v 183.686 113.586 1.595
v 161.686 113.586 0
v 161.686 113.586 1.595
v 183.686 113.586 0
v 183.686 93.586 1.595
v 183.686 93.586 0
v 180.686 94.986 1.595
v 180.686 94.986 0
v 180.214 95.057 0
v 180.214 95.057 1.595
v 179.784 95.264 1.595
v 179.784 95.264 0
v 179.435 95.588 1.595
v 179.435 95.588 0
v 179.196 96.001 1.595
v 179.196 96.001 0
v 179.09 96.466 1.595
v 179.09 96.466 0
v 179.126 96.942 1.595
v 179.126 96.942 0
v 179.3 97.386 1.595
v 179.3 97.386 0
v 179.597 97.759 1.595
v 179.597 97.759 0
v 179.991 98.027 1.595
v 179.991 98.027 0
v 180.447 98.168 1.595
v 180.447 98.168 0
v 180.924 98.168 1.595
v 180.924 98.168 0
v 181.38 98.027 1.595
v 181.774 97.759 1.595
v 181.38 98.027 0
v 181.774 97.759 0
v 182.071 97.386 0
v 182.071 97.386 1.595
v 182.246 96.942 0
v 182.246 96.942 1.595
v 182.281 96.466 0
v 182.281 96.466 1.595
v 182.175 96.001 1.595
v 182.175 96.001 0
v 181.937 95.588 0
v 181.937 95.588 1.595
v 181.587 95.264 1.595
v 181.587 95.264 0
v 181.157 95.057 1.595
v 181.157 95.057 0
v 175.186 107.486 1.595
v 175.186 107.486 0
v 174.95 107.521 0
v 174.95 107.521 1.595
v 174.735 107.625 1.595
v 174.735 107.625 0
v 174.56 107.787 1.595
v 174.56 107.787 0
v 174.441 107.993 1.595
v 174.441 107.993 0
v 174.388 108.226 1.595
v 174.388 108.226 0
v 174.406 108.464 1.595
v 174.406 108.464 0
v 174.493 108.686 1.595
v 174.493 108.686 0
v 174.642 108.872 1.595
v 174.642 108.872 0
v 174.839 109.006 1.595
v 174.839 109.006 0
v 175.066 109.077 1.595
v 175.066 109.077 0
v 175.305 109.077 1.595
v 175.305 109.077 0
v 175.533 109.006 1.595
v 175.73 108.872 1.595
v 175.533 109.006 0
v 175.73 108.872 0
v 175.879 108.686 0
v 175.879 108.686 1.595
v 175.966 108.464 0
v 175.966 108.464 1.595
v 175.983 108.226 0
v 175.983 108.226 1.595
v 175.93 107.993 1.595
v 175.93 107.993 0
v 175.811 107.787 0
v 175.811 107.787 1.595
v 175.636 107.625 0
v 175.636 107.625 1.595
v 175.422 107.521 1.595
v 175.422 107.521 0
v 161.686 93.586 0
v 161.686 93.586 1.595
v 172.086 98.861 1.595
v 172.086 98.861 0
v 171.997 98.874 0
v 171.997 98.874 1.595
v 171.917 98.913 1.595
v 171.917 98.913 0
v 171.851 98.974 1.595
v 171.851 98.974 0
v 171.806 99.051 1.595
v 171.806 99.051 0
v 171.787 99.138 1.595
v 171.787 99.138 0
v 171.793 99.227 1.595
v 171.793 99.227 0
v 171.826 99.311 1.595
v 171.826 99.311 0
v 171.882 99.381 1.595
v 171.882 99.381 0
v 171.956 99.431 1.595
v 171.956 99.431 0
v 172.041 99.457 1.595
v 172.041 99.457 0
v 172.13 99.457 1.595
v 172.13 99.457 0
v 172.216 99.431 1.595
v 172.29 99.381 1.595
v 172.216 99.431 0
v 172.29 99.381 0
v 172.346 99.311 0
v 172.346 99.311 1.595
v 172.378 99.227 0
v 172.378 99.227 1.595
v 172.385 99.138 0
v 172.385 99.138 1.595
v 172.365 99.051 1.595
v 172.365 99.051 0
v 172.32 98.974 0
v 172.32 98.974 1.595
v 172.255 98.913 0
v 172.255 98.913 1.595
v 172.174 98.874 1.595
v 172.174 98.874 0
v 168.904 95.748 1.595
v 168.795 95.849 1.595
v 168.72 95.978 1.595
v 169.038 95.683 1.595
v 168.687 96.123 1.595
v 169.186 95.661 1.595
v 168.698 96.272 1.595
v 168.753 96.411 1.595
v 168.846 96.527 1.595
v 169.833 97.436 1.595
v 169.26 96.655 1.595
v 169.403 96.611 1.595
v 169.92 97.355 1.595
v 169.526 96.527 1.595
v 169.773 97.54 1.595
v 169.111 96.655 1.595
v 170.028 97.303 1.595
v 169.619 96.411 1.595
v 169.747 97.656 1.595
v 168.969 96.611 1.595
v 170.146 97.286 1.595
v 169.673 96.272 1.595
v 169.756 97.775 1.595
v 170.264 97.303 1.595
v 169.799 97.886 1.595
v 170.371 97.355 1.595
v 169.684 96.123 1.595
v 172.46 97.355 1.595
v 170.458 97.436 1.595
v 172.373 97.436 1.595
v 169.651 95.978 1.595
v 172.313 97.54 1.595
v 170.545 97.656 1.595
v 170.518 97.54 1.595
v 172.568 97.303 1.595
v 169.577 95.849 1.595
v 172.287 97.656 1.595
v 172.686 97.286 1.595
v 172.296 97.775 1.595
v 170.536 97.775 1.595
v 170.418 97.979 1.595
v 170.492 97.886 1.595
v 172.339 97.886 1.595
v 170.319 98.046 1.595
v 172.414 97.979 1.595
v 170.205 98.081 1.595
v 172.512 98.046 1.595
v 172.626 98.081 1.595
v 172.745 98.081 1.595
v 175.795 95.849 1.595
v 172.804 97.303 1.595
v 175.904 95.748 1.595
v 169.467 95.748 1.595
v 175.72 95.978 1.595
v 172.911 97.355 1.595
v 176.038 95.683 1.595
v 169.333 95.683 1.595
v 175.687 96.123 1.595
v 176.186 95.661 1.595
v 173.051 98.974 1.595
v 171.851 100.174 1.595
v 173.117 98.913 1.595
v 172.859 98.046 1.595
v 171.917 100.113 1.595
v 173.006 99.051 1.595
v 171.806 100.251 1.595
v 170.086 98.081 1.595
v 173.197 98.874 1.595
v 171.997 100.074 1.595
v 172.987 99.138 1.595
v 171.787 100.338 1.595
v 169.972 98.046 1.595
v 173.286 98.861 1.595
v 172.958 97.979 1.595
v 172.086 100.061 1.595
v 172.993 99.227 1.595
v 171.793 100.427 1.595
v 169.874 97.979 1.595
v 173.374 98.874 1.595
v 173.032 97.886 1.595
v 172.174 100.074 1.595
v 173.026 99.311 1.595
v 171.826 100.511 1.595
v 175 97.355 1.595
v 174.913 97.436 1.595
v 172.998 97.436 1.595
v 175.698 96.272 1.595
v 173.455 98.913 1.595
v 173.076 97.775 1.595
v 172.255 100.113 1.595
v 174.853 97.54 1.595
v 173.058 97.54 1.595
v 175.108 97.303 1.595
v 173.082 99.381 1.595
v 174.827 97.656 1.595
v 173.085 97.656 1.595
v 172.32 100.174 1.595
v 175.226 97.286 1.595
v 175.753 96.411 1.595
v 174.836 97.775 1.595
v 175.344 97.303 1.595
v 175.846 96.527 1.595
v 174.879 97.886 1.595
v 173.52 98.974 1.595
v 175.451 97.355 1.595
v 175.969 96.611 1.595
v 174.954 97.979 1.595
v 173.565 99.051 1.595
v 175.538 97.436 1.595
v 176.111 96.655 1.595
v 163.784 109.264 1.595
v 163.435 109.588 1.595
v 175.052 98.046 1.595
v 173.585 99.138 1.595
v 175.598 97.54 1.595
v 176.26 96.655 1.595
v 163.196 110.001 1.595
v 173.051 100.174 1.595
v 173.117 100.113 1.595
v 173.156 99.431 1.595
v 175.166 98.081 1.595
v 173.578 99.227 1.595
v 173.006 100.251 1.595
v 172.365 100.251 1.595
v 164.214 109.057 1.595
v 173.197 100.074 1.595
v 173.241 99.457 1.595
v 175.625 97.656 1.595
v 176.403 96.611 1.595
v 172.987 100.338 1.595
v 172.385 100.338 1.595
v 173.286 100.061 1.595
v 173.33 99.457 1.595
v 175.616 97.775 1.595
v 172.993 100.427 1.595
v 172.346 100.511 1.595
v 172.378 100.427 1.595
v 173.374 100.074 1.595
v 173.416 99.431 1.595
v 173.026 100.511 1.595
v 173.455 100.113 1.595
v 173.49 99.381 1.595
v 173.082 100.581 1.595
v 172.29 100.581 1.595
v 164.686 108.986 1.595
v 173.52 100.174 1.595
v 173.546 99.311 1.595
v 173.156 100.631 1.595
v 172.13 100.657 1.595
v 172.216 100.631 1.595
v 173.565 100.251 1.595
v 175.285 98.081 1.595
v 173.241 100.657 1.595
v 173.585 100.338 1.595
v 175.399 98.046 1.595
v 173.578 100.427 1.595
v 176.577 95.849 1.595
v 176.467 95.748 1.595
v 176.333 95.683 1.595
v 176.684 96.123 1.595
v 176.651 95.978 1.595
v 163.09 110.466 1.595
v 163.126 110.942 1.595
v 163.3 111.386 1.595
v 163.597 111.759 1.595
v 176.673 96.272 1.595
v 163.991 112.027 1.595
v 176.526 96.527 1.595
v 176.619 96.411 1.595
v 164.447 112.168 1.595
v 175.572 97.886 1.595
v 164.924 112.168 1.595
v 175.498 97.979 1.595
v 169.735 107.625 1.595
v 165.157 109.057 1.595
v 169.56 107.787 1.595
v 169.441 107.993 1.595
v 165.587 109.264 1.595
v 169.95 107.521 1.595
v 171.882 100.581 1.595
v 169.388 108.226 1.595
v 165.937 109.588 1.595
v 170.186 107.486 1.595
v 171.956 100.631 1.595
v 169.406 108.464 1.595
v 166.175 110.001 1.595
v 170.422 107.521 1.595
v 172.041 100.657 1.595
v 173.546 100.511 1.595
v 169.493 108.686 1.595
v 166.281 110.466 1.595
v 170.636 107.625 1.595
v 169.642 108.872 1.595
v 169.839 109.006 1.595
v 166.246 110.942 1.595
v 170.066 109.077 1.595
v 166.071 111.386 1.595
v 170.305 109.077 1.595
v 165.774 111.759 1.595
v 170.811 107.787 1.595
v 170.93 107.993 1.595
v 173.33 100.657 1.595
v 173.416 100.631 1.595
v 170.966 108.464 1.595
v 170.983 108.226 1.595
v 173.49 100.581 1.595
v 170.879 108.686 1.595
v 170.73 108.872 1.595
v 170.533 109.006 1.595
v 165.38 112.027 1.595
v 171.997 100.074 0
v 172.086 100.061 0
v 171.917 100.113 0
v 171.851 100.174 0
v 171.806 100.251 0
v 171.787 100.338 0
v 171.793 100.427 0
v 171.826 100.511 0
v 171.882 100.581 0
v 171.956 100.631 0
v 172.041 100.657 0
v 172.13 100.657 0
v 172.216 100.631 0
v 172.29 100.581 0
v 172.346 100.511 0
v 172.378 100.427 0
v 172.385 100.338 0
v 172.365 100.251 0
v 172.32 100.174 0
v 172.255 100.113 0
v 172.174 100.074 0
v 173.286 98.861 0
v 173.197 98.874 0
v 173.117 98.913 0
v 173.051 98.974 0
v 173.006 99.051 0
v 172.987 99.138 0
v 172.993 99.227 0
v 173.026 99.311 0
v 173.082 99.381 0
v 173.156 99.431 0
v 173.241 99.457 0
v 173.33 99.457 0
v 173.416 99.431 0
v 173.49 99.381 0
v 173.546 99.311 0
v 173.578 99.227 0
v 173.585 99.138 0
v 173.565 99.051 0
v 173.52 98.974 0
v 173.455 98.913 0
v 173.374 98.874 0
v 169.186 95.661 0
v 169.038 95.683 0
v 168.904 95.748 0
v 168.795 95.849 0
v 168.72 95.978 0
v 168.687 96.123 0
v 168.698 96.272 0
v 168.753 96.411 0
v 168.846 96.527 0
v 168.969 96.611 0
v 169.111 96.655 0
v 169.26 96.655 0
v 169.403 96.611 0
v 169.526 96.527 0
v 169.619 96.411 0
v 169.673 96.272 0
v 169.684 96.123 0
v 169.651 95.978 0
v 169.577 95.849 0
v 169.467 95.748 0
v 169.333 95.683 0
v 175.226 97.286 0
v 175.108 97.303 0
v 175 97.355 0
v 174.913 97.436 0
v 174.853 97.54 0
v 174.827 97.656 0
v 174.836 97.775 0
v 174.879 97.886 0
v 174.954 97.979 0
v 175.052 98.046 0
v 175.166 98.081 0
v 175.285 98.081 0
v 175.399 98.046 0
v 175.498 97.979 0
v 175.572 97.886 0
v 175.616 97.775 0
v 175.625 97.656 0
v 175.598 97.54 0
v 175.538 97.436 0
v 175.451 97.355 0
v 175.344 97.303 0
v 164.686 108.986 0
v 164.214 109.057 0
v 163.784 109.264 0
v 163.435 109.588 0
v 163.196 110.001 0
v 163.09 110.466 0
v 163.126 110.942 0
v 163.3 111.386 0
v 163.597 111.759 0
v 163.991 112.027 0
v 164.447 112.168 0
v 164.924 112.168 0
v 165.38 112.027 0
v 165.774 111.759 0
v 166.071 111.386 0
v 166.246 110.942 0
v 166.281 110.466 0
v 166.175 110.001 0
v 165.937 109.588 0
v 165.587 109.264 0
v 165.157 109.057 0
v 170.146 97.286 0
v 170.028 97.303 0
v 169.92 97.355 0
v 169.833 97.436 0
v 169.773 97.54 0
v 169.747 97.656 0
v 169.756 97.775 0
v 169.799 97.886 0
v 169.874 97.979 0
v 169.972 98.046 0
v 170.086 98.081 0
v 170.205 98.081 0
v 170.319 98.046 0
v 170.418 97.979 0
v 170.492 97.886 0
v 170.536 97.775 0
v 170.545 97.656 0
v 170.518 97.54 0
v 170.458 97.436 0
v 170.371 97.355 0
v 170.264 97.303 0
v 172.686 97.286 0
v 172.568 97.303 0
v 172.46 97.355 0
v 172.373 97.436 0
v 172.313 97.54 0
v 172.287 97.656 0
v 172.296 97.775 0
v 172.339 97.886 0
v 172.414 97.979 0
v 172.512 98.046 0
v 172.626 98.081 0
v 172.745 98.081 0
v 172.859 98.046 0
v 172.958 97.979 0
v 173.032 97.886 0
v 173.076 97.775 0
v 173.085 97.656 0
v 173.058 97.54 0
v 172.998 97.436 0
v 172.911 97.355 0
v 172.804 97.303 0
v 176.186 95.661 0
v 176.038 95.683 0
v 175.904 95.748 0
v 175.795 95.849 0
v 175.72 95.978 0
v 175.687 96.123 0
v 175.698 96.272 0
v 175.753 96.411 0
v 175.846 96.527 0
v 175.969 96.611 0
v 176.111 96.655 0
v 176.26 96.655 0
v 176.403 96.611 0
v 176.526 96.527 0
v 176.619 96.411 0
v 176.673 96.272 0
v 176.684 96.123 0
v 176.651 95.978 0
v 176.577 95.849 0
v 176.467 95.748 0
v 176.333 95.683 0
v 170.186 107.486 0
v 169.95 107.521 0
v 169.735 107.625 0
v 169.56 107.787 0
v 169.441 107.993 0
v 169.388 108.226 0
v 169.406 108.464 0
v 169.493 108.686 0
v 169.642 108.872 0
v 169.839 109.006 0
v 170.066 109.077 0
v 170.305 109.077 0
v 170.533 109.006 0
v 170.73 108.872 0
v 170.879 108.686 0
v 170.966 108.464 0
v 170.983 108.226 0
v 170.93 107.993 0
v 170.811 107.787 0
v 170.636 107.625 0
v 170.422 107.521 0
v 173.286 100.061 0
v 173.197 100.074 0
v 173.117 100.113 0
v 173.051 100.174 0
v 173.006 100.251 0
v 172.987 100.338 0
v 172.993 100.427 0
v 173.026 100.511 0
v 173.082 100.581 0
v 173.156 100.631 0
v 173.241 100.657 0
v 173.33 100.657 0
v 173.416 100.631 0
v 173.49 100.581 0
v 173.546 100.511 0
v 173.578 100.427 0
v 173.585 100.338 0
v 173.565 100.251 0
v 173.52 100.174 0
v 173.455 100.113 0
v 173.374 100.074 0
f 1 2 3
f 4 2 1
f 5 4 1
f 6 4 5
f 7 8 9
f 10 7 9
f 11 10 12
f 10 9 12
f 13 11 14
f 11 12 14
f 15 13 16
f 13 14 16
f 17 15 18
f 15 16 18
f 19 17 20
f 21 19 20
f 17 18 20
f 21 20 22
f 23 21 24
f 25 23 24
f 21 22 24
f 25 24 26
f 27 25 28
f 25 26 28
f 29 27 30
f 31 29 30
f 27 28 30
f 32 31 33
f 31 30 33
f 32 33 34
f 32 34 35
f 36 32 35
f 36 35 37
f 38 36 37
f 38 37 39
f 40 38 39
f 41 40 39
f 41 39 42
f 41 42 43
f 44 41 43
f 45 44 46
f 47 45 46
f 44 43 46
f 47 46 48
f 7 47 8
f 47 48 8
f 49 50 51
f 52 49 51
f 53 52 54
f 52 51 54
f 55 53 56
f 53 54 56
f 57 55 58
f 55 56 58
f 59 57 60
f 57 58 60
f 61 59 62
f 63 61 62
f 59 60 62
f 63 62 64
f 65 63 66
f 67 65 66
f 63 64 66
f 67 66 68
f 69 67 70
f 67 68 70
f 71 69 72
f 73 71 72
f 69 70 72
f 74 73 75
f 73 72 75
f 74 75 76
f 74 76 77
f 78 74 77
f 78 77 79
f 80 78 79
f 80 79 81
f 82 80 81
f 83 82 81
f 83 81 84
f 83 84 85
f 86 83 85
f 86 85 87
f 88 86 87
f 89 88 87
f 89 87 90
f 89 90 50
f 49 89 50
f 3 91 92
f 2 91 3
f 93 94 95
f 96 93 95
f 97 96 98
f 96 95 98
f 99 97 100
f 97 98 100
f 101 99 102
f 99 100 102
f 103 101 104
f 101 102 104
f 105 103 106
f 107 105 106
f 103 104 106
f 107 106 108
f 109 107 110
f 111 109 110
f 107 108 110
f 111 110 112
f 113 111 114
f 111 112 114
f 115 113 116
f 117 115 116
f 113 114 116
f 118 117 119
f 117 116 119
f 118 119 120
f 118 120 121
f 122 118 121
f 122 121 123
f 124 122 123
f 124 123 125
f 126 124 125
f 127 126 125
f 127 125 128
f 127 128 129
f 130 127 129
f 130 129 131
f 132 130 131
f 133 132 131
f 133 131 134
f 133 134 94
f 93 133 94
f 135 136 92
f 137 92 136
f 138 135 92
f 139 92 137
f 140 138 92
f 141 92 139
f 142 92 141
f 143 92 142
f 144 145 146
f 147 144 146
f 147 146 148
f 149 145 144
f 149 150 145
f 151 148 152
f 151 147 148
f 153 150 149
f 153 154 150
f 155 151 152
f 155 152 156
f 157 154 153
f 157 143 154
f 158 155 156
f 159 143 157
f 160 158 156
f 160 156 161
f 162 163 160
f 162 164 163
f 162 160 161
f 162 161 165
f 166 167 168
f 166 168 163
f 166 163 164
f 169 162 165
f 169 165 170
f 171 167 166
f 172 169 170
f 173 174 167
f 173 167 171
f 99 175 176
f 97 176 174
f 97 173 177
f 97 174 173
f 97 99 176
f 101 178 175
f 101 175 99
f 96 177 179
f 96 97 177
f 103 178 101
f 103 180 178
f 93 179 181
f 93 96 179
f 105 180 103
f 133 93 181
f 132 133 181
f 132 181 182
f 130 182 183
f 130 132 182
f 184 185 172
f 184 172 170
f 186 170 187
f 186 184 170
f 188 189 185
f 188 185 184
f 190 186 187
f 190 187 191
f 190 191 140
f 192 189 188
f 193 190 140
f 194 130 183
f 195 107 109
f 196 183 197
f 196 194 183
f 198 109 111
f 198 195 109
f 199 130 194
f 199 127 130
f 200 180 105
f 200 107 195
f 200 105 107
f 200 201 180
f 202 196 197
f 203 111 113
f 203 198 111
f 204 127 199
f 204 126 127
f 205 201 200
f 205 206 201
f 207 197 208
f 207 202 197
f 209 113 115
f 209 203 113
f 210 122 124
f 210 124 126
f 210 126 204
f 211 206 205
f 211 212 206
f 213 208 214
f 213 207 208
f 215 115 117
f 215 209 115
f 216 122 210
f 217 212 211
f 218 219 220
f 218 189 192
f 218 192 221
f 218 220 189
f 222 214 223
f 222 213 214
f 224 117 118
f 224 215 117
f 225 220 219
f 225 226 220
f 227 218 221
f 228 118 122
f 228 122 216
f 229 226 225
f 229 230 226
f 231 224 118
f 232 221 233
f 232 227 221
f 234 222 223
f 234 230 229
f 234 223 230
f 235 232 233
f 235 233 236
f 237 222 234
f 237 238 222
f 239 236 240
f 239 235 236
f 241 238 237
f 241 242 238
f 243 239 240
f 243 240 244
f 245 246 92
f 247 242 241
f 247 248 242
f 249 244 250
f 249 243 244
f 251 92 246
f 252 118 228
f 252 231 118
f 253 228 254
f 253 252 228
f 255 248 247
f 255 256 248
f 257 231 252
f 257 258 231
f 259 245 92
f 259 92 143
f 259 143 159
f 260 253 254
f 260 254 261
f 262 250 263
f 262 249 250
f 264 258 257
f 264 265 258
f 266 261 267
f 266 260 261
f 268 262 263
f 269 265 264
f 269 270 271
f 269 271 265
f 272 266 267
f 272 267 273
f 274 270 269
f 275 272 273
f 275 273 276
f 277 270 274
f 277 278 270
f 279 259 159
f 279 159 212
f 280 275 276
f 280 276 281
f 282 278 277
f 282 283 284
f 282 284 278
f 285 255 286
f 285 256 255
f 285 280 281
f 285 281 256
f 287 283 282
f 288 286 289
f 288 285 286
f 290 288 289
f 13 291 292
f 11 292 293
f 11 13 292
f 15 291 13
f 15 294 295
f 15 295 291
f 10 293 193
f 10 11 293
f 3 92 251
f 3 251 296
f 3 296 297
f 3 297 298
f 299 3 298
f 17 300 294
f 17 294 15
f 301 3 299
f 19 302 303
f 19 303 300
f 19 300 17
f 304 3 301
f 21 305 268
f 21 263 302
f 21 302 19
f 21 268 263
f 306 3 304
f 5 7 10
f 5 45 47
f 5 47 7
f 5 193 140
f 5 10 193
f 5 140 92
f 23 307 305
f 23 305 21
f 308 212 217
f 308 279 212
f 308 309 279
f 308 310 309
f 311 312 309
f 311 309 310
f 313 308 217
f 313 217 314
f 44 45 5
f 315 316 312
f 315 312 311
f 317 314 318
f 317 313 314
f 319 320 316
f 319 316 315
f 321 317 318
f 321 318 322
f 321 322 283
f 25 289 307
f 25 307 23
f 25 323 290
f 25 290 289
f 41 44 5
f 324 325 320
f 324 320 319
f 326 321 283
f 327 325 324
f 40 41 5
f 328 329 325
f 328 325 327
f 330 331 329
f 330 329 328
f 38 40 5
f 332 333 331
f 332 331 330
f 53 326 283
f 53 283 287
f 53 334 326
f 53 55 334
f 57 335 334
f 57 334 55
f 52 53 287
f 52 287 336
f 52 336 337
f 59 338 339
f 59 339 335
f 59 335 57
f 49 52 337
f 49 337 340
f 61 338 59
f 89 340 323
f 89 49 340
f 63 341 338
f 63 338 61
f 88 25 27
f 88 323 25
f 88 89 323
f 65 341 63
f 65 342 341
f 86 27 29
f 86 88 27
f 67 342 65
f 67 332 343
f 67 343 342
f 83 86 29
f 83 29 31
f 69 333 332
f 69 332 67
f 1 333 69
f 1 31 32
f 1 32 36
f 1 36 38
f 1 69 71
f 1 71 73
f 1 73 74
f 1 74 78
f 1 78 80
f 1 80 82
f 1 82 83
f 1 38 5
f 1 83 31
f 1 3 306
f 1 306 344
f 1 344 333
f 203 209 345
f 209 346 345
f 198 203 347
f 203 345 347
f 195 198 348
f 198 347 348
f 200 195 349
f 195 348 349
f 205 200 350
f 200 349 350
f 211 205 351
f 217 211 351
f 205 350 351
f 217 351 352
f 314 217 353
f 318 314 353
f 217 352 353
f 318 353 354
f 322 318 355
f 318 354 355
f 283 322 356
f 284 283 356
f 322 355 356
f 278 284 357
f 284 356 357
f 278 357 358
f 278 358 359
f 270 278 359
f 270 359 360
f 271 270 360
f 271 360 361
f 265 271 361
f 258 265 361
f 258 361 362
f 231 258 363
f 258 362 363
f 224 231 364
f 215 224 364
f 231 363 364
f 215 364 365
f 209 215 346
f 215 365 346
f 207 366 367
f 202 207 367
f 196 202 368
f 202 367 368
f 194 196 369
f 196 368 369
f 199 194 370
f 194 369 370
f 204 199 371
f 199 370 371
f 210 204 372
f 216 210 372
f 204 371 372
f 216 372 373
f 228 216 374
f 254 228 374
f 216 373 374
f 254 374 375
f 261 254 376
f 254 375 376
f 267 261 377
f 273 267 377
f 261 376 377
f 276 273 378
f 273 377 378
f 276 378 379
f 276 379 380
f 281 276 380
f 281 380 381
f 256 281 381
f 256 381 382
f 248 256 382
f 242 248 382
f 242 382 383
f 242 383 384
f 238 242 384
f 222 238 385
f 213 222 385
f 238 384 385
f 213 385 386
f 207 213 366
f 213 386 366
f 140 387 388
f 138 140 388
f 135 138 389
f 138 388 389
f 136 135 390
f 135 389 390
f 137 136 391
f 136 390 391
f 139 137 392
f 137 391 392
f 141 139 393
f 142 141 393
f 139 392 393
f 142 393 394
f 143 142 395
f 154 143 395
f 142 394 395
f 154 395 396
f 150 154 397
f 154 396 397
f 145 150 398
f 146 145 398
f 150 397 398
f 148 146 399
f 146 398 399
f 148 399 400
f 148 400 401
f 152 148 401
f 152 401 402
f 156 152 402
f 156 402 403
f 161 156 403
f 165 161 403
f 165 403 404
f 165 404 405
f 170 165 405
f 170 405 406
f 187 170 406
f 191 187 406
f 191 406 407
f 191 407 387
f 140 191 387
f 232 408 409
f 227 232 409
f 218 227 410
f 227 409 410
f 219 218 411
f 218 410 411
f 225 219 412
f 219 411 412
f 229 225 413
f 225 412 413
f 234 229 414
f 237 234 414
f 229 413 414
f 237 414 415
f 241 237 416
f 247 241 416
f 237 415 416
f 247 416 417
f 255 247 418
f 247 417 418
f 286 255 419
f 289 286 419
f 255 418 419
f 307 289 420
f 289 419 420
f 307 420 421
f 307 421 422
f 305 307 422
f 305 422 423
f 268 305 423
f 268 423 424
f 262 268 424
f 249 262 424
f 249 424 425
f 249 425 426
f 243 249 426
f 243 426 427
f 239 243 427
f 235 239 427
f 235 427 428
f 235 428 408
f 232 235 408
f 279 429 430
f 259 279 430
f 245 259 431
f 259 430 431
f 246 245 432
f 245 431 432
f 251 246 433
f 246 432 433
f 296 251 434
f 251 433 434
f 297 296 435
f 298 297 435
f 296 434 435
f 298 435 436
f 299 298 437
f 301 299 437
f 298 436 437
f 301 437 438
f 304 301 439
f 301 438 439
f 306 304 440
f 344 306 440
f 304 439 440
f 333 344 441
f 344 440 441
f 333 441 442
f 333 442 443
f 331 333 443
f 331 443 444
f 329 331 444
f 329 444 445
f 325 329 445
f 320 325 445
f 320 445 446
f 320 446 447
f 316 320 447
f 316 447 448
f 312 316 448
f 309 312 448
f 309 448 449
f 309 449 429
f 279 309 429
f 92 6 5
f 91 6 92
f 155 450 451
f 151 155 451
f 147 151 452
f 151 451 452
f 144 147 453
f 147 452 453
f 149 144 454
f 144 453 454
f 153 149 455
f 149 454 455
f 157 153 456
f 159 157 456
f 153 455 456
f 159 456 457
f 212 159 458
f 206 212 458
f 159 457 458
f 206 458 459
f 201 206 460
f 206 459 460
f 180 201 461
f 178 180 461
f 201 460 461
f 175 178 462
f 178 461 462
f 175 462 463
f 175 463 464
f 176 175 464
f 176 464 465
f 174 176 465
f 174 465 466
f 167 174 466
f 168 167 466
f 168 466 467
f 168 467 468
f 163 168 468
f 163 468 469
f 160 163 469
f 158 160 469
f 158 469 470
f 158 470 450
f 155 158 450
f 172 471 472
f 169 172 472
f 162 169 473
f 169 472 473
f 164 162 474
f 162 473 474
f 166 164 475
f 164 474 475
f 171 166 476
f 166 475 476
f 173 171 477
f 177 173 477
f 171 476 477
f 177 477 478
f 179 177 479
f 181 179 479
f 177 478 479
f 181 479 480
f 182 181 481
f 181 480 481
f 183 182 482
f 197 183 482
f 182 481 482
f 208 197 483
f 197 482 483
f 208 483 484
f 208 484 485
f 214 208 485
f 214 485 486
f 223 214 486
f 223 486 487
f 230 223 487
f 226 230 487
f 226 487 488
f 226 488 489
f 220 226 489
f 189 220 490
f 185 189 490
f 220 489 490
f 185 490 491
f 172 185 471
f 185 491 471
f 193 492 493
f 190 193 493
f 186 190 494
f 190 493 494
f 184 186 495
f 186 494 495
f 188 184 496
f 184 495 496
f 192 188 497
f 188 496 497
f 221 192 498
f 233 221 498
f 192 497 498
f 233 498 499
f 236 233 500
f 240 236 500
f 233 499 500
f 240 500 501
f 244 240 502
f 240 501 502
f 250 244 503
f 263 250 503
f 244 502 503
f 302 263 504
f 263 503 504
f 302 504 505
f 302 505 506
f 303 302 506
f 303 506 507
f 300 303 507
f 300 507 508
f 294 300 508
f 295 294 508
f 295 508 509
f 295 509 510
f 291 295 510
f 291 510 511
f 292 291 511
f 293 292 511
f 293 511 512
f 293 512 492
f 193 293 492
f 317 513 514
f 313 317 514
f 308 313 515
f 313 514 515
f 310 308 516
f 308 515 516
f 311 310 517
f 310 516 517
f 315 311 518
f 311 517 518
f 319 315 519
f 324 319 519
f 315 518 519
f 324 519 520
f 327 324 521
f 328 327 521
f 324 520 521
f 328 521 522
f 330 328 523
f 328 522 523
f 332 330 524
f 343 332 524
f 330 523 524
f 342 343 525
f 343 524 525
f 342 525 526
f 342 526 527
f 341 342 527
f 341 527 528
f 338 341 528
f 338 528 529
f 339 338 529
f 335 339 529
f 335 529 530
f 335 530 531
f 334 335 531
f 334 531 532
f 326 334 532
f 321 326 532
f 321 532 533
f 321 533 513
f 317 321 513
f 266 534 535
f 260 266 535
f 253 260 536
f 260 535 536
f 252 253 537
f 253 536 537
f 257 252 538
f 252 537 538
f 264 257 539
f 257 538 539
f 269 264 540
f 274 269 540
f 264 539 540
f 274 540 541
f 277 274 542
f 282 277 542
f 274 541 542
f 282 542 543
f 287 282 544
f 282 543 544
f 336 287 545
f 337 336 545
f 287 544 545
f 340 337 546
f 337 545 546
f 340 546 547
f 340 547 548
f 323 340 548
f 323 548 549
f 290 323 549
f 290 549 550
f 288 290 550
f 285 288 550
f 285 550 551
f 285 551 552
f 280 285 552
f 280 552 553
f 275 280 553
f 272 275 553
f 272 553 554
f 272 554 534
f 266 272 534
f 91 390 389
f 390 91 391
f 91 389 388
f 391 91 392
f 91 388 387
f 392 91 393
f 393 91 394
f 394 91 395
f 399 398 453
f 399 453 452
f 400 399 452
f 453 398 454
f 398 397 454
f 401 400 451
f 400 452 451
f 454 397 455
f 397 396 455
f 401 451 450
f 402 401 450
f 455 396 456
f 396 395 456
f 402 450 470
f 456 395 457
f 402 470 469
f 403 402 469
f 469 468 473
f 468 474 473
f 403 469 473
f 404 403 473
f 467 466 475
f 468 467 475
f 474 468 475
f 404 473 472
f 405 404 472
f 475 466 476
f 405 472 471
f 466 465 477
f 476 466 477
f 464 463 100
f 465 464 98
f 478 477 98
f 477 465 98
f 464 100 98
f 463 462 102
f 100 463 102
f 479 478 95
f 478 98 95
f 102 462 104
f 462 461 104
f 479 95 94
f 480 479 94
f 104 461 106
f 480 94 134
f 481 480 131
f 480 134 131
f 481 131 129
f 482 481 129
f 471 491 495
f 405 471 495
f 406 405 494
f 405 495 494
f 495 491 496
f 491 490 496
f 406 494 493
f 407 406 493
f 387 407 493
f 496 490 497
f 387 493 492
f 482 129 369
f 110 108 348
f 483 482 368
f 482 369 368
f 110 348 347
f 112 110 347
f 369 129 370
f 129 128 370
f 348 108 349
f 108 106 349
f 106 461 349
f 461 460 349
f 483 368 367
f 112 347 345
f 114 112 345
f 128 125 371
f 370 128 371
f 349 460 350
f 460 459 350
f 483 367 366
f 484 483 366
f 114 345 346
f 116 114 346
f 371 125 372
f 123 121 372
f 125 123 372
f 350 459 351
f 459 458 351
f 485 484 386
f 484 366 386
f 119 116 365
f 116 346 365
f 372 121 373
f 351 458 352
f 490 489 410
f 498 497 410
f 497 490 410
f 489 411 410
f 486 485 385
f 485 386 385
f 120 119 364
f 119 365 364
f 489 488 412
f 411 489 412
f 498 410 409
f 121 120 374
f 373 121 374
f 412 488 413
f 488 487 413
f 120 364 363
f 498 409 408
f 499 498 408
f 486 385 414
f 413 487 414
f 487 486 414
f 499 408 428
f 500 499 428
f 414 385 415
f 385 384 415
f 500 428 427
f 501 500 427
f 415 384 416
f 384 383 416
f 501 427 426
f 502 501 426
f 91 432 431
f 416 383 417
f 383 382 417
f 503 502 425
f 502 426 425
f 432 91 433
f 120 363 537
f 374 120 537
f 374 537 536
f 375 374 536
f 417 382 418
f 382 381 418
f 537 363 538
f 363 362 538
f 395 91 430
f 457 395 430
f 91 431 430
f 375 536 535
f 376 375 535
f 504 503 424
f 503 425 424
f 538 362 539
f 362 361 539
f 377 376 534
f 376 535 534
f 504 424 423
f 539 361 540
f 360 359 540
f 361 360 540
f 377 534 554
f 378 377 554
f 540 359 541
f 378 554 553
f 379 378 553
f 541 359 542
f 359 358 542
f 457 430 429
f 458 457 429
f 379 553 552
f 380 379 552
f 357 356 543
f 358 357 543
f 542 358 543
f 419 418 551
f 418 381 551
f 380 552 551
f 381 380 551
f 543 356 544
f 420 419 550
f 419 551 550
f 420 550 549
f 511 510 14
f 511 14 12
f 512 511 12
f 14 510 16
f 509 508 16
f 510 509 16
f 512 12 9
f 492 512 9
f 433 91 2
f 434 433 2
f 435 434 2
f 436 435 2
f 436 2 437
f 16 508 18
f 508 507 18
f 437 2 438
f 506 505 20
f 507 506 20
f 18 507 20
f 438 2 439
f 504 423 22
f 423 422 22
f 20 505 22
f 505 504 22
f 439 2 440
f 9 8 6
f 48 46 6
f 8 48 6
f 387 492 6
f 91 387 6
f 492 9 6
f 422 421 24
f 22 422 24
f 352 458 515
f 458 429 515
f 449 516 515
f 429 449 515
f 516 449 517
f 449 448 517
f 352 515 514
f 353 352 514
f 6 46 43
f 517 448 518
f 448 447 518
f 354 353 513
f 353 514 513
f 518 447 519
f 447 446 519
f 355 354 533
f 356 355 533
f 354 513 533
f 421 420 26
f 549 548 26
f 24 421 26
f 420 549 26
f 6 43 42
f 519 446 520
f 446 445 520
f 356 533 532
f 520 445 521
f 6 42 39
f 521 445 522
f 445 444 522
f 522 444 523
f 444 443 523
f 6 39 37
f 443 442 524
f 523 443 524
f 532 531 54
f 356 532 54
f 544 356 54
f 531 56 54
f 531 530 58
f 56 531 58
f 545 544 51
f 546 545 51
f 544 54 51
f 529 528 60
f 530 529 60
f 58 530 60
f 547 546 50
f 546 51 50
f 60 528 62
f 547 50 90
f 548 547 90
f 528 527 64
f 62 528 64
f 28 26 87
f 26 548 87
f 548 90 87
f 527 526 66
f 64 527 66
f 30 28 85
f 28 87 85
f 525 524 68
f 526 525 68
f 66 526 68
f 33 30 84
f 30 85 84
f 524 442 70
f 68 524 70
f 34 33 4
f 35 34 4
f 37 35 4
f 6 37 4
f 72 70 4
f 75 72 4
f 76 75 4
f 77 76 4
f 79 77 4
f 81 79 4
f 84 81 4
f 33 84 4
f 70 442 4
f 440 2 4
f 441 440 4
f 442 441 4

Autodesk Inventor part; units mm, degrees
ref_plane "YZ Plane" through (0, 0, 0) normal (1, 0, 0) x (0, 1, 0)
ref_plane "XZ Plane" through (0, 0, 0) normal (0, 1, 0) x (-1, 0, 0)
ref_plane "BoardFrontPlane" through (0, 0, 0) normal (0, 0, 1) x (1, 0, 0)
sketch "Sketch1" plane through (0, 0, 0) normal (0, 0, 1) x (1, 0, 0)
  line L0 (161.6857, 93.5857) -> (161.6857, 113.5857)
  line L1 (161.6857, 113.5857) -> (183.6857, 113.5857)
  line L2 (183.6857, 113.5857) -> (183.6857, 93.5857)
  line L3 (183.6857, 93.5857) -> (161.6857, 93.5857)
extrude "BoardOutline" add sketch "Sketch1" along normal blind 1.5954
sketch "Sketch10" plane through (0, 0, 1.5954) normal (0, 0, 1) x (1, 0, 0)
  point P0 (175.1857, 108.2857)
hole "CN3-1" at (175.1857, 108.2857, 1.5954) direction (0, 0, -1) diameter 1.6 end through all
sketch "Sketch11" plane through (0, 0, 1.5954) normal (0, 0, 1) x (1, 0, 0)
  point P0 (170.1857, 108.2857)
hole "CN3-2" at (170.1857, 108.2857, 1.5954) direction (0, 0, -1) diameter 1.6 end through all
sketch "Sketch12" plane through (0, 0, 1.5954) normal (0, 0, 1) x (1, 0, 0)
  point P0 (164.6857, 110.5857)
hole "Free-1" at (164.6857, 110.5857, 1.5954) direction (0, 0, -1) diameter 3.2 end through all
sketch "Sketch13" plane through (0, 0, 1.5954) normal (0, 0, 1) x (1, 0, 0)
  point P0 (180.6857, 96.5857)
hole "Free-0" at (180.6857, 96.5857, 1.5954) direction (0, 0, -1) diameter 3.2 end through all
sketch "img_Top" plane through (0, 0, 1.5954) normal (0, 0, 1) x (1, 0, 0)
  line L0 (161.6857, 113.5857) -> (183.6857, 113.5857) construction
  line L1 (183.6857, 113.5857) -> (183.6857, 93.5926) construction
  line L2 (183.6857, 93.5926) -> (161.6857, 93.5926) construction
  line L3 (161.6857, 93.5926) -> (161.6857, 113.5857) construction
decal "Decal_Top"
sketch "img_Bottom" plane through (0, 0, -1.5954) normal (0, 0, -1) x (1, 0, 0)
  line L0 (161.6857, -93.5857) -> (183.6857, -93.5857) construction
  line L1 (183.6857, -93.5857) -> (183.6857, -113.5787) construction
  line L2 (183.6857, -113.5787) -> (161.6857, -113.5787) construction
  line L3 (161.6857, -113.5787) -> (161.6857, -93.5857) construction
decal "Decal_Bottom"
sketch "Sketch16" plane through (0, 0, 1.5954) normal (0, 0, 1) x (1, 0, 0)
  point P0 (172.0857, 99.1607)
hole "CN2-4" at (172.0857, 99.1607, 1.5954) direction (0, 0, -1) diameter 0.6 end through all
sketch "Sketch17" plane through (0, 0, 1.5954) normal (0, 0, 1) x (1, 0, 0)
  point P0 (172.0857, 100.3607)
hole "CN2-1" at (172.0857, 100.3607, 1.5954) direction (0, 0, -1) diameter 0.6 end through all
sketch "Sketch18" plane through (0, 0, 1.5954) normal (0, 0, 1) x (1, 0, 0)
  point P0 (173.2857, 99.1607)
hole "CN2-3" at (173.2857, 99.1607, 1.5954) direction (0, 0, -1) diameter 0.6 end through all
sketch "Sketch19" plane through (0, 0, 1.5954) normal (0, 0, 1) x (1, 0, 0)
  point P0 (173.2857, 100.3607)
hole "CN2-2" at (173.2857, 100.3607, 1.5954) direction (0, 0, -1) diameter 0.6 end through all
sketch "Sketch20" plane through (0, 0, 1.5954) normal (0, 0, 1) x (1, 0, 0)
  point P0 (169.1857, 96.1607)
hole "CN2-0_SEOGABLU" at (169.1857, 96.1607, 1.5954) direction (0, 0, -1) diameter 1 end through all
sketch "Sketch21" plane through (0, 0, 1.5954) normal (0, 0, 1) x (1, 0, 0)
  point P0 (176.1857, 96.1607)
hole "CN2-0_AERYPNHJ" at (176.1857, 96.1607, 1.5954) direction (0, 0, -1) diameter 1 end through all
sketch "Sketch22" plane through (0, 0, 1.5954) normal (0, 0, 1) x (1, 0, 0)
  point P0 (172.6857, 97.6857)
hole "CN1-2" at (172.6857, 97.6857, 1.5954) direction (0, 0, -1) diameter 0.8 end through all
sketch "Sketch23" plane through (0, 0, 1.5954) normal (0, 0, 1) x (1, 0, 0)
  point P0 (170.1457, 97.6857)
hole "CN1-3" at (170.1457, 97.6857, 1.5954) direction (0, 0, -1) diameter 0.8 end through all
sketch "Sketch24" plane through (0, 0, 1.5954) normal (0, 0, 1) x (1, 0, 0)
  point P0 (175.2257, 97.6857)
hole "CN1-1" at (175.2257, 97.6857, 1.5954) direction (0, 0, -1) diameter 0.8 end through all
properties part number "valve_driver_BOARD"
